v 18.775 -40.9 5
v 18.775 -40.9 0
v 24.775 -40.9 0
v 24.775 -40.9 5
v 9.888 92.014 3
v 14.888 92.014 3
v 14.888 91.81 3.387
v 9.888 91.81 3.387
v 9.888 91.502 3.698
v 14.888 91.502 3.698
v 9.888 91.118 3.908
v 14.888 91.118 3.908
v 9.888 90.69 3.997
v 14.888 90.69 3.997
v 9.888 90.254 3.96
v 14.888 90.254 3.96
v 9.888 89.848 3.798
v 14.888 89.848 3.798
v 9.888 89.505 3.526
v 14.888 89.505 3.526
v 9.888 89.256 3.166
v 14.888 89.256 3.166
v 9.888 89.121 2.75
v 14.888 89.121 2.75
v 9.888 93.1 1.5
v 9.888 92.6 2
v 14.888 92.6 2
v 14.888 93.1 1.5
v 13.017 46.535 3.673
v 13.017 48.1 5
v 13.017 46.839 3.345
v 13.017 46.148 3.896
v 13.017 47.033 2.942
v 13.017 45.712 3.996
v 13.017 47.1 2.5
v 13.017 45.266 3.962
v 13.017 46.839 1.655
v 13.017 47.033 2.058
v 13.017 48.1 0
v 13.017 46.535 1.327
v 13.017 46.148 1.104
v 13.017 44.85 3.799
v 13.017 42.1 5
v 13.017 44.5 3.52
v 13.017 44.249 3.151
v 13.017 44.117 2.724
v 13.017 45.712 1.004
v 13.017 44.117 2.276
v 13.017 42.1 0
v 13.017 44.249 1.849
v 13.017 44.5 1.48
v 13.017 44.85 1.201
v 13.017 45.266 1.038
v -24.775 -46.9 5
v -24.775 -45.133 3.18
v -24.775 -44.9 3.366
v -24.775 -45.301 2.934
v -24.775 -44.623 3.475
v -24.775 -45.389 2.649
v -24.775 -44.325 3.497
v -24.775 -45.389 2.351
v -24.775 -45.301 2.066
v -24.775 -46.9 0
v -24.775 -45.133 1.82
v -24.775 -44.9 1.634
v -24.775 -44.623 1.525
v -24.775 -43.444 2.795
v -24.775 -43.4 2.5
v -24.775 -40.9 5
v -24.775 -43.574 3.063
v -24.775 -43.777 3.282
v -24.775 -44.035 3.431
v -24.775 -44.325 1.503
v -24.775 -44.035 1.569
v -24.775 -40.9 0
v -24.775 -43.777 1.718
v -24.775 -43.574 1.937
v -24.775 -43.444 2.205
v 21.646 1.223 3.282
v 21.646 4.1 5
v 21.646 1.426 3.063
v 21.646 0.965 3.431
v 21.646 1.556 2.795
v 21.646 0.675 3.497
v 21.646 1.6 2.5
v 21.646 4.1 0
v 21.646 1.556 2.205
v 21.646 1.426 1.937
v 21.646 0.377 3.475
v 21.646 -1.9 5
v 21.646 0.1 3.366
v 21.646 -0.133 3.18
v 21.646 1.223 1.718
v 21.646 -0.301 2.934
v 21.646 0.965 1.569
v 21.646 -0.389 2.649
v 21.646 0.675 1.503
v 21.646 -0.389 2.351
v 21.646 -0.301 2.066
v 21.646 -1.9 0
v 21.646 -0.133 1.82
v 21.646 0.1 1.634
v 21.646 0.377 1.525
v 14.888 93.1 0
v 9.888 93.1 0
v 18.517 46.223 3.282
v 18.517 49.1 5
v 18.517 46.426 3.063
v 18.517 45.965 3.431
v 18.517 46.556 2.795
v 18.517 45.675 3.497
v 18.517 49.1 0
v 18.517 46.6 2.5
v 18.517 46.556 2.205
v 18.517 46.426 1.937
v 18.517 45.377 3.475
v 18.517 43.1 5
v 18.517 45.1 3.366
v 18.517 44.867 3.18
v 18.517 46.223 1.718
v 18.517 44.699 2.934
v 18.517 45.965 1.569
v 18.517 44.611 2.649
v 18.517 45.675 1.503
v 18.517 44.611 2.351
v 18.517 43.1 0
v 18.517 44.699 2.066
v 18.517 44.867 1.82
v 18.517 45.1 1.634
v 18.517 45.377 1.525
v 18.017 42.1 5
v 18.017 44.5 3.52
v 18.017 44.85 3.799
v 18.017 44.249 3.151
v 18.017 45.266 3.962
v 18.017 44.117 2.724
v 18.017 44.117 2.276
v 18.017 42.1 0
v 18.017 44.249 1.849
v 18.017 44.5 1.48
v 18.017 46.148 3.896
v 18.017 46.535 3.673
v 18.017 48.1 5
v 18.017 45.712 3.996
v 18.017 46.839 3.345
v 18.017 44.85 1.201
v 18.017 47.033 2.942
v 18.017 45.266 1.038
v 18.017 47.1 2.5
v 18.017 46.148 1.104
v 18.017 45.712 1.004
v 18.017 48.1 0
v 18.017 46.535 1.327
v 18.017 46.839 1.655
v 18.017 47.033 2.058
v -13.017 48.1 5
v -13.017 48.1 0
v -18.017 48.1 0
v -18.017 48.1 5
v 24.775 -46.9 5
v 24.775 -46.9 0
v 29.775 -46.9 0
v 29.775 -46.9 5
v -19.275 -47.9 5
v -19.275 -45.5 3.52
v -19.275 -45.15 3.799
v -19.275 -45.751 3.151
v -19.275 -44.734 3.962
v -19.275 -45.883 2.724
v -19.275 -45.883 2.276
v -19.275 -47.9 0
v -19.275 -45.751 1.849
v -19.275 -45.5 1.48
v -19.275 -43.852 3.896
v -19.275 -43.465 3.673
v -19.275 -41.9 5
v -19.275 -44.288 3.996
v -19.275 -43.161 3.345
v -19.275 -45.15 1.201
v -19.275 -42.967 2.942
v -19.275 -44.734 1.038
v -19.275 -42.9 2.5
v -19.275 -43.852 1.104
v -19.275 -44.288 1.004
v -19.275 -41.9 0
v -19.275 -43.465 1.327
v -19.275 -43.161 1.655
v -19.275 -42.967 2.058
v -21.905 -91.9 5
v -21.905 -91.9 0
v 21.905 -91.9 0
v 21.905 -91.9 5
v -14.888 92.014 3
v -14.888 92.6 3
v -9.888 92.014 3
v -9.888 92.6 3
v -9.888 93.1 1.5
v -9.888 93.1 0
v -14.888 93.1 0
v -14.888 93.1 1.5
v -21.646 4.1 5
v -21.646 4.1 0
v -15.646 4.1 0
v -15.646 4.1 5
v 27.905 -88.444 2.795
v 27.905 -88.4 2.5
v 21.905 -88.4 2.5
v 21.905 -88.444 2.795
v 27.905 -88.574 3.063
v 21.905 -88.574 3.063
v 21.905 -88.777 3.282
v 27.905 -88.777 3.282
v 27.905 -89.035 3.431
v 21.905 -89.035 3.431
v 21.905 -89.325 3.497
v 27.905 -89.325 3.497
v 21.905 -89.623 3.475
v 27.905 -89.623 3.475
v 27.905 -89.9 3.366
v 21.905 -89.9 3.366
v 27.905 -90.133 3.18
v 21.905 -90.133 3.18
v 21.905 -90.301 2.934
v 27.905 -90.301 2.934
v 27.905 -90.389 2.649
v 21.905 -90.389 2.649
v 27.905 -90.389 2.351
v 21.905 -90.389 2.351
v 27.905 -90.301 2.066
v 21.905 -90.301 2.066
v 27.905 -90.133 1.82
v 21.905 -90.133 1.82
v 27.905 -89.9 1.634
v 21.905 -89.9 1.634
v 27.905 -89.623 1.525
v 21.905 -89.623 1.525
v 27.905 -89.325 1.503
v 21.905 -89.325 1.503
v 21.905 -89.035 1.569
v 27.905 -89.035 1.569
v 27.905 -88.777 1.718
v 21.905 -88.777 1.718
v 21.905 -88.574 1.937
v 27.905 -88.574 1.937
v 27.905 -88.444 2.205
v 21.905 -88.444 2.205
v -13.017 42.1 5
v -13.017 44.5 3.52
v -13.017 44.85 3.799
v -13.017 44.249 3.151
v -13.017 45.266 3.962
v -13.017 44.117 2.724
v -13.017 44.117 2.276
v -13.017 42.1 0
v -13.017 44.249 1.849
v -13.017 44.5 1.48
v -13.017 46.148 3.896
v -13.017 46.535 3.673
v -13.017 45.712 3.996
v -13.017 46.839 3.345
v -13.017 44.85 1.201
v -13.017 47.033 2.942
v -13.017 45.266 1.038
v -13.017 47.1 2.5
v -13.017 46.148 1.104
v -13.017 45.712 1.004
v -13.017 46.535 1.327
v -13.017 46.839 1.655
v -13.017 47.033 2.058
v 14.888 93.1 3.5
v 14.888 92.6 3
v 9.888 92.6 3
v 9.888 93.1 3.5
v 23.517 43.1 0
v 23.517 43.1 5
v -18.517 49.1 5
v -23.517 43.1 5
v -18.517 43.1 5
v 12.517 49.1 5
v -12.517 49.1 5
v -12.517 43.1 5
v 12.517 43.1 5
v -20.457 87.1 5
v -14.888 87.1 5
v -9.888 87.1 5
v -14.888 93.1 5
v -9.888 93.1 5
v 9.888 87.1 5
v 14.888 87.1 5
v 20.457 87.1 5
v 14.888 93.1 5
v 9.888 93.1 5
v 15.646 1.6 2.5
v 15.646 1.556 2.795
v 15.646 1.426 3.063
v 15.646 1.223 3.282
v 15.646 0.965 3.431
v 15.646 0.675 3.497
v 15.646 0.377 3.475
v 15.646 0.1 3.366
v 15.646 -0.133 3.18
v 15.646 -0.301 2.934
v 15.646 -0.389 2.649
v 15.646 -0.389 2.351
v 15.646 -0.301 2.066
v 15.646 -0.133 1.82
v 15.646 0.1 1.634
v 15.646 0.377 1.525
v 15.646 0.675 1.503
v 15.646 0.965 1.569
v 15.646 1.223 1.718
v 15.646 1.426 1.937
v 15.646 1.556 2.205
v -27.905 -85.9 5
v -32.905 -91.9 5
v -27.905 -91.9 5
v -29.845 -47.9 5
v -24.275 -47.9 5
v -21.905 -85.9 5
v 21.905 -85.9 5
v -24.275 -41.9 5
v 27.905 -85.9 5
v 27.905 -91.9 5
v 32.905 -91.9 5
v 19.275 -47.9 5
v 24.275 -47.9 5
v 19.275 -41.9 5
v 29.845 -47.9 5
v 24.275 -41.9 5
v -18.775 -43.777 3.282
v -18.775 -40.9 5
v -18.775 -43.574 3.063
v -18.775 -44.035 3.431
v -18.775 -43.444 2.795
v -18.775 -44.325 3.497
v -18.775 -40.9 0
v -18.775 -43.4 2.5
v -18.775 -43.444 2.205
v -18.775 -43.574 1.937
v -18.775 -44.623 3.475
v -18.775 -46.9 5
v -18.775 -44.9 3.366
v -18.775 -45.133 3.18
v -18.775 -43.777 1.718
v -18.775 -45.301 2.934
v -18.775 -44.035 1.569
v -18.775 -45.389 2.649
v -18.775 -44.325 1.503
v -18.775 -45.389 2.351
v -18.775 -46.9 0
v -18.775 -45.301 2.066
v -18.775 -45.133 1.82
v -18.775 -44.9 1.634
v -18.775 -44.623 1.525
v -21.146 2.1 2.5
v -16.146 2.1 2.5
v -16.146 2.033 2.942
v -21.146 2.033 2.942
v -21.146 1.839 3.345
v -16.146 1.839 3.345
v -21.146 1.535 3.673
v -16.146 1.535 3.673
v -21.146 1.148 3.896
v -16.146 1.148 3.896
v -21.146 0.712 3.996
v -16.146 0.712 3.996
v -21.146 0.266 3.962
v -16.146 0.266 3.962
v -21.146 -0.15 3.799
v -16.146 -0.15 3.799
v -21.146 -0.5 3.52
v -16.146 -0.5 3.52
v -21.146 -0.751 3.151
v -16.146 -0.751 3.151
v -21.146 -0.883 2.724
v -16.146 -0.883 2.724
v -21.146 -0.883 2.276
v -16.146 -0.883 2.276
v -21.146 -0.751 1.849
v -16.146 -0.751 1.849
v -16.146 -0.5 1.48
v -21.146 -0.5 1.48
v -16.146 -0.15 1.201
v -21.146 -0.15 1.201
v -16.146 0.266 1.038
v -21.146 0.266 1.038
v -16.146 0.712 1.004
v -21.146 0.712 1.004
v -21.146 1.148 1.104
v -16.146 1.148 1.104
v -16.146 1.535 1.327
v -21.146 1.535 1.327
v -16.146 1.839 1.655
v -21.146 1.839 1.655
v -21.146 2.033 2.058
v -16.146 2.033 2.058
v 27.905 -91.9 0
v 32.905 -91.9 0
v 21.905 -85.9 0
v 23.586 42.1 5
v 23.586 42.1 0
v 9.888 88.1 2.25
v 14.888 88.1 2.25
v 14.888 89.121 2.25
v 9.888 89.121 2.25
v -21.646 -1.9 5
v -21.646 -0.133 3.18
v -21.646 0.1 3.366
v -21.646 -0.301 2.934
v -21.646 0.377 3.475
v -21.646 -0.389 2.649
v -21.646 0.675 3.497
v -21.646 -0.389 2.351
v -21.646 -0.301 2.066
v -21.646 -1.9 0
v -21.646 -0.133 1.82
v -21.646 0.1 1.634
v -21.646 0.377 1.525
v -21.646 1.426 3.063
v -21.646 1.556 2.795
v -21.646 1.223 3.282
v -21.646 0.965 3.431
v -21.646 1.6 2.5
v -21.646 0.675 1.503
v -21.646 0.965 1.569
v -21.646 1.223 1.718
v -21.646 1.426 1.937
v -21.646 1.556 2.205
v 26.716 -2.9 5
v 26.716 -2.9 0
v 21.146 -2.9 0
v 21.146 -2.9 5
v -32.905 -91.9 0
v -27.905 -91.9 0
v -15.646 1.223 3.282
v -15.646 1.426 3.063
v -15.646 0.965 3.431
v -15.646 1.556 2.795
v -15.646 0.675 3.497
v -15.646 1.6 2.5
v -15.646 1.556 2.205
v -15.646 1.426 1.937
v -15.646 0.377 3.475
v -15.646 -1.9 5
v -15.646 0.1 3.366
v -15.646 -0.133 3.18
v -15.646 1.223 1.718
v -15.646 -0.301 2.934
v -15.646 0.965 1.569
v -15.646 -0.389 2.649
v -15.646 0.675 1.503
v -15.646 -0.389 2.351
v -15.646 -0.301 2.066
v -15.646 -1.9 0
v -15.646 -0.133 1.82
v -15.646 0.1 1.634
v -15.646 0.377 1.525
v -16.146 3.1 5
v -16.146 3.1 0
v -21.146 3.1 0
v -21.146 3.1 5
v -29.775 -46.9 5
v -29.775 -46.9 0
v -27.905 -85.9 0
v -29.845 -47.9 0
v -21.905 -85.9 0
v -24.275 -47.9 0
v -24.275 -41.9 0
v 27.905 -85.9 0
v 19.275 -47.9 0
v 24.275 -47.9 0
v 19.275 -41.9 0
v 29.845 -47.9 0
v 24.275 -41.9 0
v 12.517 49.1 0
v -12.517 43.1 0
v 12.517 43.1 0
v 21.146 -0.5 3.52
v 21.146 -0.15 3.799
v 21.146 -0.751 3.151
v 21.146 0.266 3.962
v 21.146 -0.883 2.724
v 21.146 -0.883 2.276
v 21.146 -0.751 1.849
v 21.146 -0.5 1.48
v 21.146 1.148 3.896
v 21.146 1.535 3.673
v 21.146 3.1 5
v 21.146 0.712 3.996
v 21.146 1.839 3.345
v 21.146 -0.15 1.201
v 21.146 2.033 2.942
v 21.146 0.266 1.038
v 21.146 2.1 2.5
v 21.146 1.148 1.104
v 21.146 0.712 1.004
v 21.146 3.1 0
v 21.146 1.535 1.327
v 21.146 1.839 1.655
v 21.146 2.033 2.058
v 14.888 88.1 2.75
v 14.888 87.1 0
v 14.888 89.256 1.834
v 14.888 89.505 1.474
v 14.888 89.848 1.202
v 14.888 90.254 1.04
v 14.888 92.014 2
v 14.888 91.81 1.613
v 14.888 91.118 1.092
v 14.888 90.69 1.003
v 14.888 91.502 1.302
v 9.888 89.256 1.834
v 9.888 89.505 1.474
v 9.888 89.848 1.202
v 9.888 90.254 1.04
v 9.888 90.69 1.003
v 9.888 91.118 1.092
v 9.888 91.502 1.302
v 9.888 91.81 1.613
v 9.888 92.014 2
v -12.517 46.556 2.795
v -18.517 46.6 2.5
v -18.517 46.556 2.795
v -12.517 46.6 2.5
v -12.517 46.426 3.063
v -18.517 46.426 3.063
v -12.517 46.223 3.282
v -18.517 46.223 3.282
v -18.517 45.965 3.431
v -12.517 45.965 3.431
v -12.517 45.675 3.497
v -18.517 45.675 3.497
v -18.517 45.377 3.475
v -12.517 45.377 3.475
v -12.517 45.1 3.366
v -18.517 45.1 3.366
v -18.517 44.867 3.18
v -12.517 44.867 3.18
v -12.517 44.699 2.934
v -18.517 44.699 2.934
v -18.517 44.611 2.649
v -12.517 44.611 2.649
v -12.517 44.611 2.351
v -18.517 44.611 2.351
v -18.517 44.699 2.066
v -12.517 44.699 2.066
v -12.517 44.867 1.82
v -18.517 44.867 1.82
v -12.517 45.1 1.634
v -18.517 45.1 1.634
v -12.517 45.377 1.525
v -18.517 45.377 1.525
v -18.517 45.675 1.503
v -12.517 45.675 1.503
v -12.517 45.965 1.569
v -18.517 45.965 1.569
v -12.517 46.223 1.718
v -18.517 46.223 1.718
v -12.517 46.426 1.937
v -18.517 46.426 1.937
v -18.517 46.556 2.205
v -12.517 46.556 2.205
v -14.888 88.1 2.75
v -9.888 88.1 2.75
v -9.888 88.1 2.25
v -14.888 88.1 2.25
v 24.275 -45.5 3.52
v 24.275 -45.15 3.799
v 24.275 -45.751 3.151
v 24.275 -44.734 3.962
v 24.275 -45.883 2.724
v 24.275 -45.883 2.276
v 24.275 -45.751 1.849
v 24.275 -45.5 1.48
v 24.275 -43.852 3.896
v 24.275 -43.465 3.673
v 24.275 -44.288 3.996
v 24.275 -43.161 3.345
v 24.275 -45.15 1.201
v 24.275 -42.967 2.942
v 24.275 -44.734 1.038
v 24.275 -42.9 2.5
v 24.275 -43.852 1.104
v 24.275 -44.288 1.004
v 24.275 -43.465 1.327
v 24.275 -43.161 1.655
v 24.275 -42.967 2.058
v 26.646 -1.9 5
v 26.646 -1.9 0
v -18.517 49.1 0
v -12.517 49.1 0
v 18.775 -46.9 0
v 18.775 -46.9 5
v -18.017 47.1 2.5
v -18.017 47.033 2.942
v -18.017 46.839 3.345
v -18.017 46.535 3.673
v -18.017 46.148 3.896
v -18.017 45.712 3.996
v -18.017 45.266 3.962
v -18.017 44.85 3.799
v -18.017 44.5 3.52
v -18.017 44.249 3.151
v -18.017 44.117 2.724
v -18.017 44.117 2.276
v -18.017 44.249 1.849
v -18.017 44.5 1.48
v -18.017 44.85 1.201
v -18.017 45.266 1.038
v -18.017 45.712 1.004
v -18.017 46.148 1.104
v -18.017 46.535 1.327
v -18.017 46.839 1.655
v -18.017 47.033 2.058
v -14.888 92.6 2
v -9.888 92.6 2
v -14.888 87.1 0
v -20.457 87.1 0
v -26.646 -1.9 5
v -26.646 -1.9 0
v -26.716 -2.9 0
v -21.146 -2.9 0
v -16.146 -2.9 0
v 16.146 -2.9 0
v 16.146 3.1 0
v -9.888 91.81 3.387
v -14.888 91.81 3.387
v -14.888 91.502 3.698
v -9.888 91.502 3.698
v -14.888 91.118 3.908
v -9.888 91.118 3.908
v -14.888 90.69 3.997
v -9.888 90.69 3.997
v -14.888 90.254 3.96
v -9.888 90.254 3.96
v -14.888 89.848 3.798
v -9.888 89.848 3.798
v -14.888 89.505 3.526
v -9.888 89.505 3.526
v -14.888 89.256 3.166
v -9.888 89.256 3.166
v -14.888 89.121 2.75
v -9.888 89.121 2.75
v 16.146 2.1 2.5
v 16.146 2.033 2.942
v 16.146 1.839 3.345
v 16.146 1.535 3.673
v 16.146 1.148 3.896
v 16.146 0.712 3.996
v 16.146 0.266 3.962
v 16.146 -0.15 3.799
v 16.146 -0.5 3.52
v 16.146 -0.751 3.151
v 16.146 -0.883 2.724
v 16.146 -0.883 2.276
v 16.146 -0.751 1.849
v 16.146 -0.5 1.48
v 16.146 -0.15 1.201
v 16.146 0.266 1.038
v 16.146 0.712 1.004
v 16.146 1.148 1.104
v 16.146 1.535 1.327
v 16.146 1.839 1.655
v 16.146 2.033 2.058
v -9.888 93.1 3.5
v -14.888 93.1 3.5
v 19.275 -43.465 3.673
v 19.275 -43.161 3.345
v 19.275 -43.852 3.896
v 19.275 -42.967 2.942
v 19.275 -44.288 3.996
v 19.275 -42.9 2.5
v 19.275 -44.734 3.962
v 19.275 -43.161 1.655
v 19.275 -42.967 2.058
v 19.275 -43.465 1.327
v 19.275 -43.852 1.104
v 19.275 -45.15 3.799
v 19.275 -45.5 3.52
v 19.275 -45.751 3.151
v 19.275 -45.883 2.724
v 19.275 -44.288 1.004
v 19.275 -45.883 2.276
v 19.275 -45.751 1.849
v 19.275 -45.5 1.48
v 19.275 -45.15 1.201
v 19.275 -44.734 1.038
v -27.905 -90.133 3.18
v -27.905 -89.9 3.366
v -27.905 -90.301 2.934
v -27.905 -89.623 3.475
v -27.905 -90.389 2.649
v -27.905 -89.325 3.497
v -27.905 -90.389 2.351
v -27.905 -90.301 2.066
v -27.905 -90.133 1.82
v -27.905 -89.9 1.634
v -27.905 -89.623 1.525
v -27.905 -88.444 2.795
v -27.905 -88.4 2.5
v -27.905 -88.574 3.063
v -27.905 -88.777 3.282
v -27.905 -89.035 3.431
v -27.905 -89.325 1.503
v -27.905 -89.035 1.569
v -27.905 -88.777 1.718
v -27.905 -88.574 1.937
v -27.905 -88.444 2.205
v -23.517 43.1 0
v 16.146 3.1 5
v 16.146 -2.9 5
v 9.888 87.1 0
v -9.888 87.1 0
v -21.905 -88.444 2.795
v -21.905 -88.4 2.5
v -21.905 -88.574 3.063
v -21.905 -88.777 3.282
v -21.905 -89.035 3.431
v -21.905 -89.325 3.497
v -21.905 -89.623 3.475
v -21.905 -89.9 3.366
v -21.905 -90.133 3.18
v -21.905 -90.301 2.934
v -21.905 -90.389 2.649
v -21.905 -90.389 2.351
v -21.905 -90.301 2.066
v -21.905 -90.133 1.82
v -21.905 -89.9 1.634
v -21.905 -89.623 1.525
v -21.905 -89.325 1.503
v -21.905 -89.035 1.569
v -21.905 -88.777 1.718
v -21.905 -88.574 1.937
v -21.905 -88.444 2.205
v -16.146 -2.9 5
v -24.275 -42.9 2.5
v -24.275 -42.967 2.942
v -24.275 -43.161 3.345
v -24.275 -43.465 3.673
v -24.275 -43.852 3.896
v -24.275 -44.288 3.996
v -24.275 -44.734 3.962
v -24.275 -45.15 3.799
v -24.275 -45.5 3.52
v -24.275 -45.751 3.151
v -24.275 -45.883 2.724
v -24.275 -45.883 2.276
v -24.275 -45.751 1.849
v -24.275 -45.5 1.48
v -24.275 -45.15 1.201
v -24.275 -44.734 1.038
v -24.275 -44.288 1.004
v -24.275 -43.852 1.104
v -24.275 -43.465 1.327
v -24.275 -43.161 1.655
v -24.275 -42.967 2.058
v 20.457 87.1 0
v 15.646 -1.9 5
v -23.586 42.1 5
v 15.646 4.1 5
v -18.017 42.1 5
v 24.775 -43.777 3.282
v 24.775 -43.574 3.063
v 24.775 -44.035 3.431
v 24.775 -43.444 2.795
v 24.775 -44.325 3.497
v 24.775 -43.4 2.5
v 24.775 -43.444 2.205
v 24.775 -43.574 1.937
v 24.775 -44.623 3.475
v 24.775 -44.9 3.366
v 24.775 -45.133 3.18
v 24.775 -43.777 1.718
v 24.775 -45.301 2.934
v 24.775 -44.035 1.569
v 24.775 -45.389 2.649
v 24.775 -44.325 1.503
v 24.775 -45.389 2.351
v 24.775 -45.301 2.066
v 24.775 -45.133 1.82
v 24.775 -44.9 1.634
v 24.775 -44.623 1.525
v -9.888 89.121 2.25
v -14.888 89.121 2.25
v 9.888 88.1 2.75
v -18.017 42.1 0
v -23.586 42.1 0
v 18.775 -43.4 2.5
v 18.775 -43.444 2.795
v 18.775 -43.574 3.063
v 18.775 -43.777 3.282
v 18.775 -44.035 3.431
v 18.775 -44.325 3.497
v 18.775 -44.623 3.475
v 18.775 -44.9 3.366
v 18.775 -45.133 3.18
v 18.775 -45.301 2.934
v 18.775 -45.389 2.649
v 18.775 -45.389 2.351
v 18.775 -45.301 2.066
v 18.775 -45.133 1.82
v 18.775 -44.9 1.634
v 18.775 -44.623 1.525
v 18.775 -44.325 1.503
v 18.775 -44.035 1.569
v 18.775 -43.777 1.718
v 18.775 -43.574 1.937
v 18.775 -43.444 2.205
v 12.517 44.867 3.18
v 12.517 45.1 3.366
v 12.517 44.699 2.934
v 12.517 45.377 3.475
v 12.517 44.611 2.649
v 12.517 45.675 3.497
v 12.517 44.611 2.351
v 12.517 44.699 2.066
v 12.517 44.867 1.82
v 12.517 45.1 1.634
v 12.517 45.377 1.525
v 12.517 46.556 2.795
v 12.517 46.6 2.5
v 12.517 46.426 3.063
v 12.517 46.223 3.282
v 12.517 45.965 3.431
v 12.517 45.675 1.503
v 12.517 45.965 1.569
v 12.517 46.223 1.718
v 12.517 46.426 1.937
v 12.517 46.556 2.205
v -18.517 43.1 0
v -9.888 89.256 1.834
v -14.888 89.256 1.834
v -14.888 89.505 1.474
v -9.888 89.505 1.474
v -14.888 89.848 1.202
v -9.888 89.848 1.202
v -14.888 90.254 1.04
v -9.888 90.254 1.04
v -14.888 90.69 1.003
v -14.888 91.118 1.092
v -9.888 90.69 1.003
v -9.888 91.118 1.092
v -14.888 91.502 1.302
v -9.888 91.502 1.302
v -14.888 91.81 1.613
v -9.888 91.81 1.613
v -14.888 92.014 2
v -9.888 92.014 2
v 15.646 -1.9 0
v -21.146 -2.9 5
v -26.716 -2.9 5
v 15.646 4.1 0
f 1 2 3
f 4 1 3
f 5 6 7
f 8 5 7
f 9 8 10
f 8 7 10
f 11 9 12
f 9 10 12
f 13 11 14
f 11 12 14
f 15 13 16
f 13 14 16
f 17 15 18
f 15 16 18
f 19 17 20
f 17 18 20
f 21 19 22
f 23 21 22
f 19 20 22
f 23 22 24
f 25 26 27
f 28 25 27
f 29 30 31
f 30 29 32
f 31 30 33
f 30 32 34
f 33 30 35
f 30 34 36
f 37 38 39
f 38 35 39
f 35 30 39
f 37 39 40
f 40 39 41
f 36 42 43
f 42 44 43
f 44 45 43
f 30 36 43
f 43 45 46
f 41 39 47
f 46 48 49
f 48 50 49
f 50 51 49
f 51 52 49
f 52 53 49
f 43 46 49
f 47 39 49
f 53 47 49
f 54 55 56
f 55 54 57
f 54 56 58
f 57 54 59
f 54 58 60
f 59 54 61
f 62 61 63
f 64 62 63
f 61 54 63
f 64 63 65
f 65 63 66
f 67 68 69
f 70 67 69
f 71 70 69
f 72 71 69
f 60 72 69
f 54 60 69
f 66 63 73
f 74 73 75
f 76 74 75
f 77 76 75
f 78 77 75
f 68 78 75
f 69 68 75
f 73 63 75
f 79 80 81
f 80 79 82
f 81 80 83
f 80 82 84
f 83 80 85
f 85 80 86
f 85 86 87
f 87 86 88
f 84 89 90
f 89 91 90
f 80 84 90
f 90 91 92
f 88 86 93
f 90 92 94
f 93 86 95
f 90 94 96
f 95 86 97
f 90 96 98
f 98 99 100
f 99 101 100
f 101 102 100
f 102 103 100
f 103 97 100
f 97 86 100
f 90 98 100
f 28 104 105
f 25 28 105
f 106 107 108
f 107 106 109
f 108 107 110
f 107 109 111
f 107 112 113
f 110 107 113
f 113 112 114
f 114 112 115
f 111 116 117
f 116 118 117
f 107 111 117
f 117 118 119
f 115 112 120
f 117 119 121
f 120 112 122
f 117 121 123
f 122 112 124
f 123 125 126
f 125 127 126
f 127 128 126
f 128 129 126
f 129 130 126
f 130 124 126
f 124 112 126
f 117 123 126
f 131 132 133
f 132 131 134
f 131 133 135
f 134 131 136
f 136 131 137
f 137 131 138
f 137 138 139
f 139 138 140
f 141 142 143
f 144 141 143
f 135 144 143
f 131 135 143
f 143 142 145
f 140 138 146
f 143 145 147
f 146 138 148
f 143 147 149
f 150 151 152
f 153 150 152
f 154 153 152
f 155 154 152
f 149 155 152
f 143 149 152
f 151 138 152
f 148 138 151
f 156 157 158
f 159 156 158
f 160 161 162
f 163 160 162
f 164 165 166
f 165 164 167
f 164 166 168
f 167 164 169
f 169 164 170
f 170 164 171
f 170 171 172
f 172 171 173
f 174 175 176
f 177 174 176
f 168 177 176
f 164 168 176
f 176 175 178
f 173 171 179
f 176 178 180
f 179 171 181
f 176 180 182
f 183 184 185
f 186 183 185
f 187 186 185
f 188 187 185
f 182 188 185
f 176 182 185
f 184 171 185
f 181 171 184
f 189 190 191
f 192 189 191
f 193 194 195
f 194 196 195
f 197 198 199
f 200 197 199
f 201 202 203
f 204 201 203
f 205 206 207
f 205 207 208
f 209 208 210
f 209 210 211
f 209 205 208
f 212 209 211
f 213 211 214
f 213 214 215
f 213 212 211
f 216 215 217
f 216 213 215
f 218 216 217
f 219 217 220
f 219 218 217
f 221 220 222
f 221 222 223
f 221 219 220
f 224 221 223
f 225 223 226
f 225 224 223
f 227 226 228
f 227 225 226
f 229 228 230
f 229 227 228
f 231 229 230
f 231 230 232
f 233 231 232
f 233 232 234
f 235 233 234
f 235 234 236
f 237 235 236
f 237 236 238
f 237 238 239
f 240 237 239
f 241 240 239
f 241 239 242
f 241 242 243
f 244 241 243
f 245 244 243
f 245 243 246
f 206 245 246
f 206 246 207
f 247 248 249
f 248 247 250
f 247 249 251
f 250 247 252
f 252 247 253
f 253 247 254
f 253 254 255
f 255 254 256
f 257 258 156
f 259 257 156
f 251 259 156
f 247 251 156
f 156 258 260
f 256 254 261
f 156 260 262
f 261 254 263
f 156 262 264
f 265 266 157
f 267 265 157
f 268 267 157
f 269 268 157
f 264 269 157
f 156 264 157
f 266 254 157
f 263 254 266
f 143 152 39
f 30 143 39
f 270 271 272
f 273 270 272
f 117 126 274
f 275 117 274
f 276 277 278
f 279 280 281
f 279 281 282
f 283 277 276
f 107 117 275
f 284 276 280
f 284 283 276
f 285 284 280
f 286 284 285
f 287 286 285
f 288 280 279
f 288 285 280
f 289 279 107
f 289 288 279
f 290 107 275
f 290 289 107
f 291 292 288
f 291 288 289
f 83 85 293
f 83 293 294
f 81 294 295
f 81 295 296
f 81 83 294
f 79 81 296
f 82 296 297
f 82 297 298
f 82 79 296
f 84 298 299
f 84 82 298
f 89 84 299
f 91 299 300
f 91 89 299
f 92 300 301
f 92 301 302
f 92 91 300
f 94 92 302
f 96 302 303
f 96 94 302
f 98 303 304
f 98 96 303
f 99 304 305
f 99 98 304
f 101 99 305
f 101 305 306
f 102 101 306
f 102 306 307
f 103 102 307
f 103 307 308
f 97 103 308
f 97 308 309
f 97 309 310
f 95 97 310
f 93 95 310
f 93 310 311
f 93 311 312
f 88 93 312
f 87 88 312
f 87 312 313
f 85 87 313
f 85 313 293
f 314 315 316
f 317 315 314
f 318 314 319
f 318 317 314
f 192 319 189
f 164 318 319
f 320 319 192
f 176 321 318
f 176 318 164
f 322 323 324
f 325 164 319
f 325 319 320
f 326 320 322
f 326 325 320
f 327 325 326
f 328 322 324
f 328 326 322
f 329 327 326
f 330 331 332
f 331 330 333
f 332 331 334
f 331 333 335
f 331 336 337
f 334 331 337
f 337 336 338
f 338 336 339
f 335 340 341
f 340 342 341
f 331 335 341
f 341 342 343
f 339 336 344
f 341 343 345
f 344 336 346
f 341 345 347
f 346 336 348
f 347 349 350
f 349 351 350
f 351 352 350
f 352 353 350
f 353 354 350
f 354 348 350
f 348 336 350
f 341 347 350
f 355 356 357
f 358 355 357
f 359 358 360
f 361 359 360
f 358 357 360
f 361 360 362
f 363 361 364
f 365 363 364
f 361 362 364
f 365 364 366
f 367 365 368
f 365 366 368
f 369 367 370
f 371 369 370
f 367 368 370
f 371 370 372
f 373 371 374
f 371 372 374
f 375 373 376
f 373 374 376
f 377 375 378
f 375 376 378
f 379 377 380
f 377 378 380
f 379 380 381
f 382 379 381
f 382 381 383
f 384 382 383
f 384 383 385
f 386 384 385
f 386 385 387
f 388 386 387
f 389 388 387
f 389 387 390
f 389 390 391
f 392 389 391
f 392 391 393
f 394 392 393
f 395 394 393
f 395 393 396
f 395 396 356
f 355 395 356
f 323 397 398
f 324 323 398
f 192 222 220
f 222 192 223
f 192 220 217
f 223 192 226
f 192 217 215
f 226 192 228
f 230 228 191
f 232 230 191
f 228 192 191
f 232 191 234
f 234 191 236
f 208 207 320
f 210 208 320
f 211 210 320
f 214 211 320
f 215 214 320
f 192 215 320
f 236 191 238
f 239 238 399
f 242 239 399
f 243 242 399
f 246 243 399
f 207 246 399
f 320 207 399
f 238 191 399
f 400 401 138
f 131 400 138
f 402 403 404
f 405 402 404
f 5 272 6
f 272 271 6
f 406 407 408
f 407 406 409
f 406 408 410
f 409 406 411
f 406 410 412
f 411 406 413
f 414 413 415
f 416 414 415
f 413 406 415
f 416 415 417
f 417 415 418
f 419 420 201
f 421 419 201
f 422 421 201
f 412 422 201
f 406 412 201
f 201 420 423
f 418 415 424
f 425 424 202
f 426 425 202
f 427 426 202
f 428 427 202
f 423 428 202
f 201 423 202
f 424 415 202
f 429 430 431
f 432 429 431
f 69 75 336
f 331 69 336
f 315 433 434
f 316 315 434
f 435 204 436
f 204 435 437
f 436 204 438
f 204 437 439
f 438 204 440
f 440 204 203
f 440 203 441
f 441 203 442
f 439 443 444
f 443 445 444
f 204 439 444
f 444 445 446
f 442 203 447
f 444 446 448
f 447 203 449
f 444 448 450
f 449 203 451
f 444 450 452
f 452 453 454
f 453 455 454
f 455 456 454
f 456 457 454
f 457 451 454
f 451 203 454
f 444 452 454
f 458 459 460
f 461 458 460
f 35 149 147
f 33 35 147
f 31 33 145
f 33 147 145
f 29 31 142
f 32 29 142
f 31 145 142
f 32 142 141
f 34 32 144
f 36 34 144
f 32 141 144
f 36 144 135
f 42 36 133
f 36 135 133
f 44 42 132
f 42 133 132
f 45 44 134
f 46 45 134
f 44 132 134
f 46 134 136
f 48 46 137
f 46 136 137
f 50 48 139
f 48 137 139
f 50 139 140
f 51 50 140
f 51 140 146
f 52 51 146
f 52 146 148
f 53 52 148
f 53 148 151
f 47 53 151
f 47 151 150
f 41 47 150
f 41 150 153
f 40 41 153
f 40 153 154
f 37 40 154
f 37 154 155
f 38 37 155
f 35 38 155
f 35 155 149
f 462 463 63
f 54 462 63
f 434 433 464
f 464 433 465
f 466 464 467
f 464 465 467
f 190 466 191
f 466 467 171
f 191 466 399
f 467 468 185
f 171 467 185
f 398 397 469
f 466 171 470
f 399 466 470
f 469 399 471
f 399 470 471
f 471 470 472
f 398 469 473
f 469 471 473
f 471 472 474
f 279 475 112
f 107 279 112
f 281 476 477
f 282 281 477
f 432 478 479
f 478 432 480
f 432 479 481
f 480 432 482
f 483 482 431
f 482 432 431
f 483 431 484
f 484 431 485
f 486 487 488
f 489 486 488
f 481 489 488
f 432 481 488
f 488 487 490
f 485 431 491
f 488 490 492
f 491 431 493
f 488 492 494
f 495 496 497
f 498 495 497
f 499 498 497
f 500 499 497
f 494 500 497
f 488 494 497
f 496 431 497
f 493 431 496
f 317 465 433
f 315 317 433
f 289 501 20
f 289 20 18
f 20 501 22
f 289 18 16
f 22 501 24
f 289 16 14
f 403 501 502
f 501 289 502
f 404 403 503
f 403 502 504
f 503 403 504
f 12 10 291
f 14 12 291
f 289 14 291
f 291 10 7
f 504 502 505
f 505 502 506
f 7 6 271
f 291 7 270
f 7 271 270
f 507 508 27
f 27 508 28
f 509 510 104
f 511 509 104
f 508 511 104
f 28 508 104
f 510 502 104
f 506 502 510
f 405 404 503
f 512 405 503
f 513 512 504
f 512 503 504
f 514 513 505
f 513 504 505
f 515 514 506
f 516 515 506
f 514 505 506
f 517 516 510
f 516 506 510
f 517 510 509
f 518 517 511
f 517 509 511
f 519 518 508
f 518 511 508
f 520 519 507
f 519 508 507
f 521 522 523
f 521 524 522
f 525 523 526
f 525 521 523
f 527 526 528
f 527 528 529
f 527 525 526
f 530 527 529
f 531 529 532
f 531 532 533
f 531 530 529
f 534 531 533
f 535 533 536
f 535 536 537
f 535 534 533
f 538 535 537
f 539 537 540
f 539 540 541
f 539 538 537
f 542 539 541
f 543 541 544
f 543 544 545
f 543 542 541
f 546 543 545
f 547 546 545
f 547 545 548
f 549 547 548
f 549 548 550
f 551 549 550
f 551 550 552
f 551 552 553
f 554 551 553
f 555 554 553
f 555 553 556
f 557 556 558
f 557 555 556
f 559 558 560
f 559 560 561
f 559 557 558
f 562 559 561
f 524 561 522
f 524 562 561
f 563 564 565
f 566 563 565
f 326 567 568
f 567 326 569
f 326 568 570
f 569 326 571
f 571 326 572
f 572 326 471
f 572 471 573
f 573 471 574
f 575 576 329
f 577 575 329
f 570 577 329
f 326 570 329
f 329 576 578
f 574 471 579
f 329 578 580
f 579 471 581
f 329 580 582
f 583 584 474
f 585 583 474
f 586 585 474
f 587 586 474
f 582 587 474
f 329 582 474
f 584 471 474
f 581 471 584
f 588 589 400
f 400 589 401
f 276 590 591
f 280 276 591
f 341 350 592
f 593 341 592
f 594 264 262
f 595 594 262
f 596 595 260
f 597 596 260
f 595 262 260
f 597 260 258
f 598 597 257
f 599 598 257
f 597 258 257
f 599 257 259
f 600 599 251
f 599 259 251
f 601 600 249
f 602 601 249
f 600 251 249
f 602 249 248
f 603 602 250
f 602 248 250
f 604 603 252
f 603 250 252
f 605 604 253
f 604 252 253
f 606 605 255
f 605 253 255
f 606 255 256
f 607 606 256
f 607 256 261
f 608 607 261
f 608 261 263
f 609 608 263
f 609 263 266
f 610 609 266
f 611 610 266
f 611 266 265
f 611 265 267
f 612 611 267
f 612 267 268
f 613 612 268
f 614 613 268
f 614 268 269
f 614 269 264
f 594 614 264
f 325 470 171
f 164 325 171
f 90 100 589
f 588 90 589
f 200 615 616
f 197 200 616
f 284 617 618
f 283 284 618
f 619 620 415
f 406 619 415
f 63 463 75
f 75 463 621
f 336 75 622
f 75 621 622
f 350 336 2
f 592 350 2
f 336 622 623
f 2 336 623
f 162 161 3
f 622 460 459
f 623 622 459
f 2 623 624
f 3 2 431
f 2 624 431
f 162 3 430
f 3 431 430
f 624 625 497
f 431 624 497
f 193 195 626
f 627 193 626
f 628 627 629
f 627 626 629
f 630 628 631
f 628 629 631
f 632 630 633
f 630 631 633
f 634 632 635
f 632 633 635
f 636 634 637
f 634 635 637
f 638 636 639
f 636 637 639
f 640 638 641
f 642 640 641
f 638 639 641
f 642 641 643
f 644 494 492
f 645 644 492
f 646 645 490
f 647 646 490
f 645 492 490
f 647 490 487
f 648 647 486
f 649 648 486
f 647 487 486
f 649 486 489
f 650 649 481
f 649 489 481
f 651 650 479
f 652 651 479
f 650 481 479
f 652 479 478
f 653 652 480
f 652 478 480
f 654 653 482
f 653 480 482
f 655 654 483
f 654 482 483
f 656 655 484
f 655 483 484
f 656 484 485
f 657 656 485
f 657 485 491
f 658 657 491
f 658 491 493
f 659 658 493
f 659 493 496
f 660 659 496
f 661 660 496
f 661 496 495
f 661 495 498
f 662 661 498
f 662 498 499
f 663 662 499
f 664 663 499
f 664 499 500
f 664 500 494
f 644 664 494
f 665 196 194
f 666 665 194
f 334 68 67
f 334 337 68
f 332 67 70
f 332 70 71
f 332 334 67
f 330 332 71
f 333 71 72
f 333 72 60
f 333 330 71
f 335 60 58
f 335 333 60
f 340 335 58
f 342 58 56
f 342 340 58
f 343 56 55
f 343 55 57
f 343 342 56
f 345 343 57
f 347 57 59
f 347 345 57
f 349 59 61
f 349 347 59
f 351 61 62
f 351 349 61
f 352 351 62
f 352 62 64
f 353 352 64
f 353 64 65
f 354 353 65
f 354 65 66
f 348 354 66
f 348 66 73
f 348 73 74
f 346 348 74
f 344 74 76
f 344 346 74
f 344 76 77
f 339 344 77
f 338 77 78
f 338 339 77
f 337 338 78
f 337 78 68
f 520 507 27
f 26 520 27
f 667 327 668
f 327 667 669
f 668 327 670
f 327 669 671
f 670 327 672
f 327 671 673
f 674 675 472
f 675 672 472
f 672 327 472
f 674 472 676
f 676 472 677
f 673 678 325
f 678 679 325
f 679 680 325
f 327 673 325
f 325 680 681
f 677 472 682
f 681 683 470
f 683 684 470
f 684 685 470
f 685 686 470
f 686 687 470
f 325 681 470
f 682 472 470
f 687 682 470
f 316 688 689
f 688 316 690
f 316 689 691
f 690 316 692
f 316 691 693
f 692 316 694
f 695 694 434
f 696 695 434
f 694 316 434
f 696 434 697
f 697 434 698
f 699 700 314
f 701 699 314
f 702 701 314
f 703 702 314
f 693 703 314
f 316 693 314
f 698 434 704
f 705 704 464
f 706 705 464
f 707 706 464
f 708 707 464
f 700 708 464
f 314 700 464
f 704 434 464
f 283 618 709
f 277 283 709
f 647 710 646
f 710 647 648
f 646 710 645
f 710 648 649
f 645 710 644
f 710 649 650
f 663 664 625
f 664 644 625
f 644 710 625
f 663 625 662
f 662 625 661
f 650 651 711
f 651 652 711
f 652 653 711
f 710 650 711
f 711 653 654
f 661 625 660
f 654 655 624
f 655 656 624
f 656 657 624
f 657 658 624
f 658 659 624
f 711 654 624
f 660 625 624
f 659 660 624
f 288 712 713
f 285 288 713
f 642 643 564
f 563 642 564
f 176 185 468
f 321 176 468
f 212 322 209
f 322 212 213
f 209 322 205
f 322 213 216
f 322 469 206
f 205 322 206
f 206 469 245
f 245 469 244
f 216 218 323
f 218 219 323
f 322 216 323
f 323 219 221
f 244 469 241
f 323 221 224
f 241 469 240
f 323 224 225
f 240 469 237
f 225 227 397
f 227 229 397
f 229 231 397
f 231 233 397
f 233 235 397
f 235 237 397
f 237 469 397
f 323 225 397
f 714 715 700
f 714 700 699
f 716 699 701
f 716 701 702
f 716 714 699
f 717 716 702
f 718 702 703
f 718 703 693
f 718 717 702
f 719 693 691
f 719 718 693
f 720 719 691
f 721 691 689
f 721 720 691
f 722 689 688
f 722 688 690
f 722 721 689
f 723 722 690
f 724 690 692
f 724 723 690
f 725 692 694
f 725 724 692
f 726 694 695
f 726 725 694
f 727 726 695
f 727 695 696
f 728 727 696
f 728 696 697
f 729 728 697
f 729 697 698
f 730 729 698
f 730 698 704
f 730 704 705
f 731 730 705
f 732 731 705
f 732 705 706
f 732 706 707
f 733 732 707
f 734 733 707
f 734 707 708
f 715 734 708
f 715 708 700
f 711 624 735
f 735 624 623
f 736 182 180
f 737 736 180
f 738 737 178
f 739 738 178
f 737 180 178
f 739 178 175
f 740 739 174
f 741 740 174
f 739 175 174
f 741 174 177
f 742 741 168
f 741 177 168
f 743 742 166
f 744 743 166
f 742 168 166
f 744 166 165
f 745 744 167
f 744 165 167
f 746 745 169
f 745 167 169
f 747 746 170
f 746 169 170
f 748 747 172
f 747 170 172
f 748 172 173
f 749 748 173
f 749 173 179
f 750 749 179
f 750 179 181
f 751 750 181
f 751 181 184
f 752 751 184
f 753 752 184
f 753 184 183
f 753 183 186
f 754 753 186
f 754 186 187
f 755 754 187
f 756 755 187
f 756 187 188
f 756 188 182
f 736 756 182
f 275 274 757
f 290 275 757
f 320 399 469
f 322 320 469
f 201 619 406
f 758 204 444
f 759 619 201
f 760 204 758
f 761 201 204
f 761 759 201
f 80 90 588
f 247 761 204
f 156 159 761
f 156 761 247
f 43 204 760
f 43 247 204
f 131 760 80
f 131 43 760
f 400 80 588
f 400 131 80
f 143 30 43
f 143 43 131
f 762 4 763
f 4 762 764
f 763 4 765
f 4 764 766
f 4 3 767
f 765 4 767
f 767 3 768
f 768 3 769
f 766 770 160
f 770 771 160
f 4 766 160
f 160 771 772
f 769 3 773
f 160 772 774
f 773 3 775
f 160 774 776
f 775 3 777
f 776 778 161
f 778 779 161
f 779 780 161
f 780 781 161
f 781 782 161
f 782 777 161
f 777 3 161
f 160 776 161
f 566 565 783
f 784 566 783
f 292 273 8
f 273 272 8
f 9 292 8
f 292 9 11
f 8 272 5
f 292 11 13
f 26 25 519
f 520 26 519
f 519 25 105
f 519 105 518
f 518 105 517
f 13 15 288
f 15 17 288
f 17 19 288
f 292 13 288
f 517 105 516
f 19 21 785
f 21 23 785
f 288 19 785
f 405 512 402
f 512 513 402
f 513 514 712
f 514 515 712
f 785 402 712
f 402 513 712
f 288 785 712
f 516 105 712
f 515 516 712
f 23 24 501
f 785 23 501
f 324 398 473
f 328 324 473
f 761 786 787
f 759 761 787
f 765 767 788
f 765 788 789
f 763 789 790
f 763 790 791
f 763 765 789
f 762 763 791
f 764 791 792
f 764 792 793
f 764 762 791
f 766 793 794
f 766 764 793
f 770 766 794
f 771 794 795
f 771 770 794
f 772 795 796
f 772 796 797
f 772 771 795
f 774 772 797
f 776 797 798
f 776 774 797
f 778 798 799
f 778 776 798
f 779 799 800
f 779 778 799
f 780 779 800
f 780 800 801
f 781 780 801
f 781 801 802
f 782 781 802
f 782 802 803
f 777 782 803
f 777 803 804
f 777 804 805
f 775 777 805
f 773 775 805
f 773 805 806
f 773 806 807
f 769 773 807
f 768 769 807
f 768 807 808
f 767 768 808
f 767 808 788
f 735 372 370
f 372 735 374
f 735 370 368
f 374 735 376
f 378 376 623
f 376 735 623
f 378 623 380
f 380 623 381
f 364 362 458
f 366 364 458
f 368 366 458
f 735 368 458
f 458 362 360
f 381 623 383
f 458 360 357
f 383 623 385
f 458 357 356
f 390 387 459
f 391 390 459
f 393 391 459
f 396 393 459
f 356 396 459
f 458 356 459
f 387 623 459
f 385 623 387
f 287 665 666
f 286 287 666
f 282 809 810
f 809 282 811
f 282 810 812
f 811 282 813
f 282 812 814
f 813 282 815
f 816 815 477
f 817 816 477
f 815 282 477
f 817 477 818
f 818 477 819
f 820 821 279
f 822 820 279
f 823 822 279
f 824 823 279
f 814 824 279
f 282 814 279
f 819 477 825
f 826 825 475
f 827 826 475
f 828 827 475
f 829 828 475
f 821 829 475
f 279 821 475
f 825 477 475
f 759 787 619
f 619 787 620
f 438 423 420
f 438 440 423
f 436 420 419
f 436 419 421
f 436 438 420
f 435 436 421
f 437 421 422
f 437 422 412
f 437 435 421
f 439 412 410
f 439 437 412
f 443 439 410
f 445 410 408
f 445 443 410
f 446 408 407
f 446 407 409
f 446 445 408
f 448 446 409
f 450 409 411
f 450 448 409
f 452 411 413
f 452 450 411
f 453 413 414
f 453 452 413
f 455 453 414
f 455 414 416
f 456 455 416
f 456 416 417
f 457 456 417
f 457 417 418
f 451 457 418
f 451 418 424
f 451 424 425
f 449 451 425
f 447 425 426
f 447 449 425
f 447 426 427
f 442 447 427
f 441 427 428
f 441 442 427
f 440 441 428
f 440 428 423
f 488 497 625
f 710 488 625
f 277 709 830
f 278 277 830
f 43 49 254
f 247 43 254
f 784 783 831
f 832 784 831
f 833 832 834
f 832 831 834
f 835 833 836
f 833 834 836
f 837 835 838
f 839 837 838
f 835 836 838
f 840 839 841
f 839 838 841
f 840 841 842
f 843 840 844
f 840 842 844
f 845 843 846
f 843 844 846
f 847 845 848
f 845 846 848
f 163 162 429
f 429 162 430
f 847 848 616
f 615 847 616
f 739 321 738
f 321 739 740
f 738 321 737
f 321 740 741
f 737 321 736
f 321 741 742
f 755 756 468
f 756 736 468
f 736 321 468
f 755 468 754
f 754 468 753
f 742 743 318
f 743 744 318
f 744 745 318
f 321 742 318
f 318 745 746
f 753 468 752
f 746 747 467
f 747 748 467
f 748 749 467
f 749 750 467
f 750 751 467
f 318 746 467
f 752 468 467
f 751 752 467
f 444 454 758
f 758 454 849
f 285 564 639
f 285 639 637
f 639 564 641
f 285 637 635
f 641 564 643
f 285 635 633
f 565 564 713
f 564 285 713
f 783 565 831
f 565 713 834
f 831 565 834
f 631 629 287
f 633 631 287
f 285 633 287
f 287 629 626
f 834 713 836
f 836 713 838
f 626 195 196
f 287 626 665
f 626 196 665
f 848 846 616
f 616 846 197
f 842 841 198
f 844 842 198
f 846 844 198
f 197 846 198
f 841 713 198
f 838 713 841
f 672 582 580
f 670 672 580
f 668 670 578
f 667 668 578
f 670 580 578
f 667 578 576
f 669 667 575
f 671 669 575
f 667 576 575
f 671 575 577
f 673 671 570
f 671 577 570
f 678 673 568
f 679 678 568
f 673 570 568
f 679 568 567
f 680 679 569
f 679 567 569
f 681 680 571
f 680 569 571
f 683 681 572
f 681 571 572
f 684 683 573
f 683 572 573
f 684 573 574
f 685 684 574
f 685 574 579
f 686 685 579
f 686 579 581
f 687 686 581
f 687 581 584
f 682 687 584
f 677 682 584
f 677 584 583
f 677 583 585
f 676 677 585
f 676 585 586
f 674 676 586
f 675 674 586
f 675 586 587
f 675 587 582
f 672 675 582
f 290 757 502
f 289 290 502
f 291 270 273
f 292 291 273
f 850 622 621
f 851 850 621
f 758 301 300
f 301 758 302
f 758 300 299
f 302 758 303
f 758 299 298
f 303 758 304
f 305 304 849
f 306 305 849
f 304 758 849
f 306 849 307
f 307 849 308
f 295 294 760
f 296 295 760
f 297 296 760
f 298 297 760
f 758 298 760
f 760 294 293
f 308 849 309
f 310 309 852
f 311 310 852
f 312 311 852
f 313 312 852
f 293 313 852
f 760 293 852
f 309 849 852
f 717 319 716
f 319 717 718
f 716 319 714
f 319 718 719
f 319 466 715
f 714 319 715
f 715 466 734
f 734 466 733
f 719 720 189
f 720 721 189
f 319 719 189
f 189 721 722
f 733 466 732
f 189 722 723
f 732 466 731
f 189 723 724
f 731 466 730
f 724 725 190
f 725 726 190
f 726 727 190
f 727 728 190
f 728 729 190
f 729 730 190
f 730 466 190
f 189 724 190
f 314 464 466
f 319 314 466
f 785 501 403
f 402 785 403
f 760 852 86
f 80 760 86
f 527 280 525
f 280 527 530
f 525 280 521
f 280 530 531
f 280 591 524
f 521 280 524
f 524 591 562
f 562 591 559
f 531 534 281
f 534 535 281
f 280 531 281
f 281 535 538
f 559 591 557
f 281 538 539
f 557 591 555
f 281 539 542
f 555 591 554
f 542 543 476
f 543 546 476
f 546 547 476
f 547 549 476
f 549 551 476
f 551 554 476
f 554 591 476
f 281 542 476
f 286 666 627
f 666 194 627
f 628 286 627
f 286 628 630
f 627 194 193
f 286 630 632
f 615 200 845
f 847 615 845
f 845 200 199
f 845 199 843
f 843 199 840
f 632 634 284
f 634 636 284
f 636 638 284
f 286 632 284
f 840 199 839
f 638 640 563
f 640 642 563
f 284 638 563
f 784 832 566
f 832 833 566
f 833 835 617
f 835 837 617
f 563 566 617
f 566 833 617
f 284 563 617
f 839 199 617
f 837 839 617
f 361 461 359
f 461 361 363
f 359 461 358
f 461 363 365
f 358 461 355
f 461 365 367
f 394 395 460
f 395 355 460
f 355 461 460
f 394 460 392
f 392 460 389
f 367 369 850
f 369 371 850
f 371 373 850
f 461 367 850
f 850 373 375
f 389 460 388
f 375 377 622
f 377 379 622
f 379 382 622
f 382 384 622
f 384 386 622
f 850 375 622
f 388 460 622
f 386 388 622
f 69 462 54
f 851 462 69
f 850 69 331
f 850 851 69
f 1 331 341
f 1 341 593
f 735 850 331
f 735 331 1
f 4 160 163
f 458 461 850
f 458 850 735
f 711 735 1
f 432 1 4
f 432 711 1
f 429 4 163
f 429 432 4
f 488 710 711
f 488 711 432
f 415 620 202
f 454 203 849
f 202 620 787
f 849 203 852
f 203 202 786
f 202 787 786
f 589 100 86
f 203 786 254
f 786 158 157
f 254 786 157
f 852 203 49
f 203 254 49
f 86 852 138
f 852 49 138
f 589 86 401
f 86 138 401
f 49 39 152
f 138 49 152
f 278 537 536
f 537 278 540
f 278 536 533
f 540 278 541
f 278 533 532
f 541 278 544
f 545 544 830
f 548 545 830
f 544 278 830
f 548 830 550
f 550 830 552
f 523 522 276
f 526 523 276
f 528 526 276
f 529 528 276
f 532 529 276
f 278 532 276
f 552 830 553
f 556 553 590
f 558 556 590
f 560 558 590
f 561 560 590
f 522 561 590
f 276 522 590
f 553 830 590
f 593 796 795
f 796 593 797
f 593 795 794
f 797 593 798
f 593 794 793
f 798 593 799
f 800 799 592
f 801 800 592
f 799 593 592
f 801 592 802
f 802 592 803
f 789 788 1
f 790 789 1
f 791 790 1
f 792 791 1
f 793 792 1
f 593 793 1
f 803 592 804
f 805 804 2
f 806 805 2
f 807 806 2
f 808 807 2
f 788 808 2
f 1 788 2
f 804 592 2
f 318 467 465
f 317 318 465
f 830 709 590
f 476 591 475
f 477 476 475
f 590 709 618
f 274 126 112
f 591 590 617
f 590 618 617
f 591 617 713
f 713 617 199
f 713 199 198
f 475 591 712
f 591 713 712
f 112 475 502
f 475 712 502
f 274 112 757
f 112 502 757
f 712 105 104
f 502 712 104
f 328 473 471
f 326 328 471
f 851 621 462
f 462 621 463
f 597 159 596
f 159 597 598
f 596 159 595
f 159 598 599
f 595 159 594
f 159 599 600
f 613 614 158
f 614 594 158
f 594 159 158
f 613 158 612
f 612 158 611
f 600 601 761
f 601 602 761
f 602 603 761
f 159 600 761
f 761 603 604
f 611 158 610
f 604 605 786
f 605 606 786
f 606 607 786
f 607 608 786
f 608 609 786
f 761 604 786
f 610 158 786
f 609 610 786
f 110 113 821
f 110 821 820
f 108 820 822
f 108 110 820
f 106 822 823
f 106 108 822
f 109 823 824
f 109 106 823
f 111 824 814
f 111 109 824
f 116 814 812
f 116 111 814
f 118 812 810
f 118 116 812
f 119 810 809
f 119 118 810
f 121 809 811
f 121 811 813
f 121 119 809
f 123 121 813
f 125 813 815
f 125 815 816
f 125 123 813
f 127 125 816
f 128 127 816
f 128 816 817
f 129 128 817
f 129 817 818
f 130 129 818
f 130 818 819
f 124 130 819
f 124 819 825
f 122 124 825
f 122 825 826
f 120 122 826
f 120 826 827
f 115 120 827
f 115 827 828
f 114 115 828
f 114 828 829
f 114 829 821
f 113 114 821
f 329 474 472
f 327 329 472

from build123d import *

# Parameters (mm, degrees)
F1_DEPTH  = 5
F12_START = -5.7
F10_R     = 1
F12_DEPTH = 62
F13_START = -5.5
F9_R      = 1.5
F9_R_2    = 1
F13_DEPTH = 55.3
F14_START = -6
F14_DEPTH = 56.6
F15_START = -6.3
F8_R      = 1.5
F8_R_2    = 1
F15_DEPTH = 49.5
F16_START = -5.7
F16_DEPTH = 49
F17_START = -6
F7_R      = 1.5
F7_R_2    = 1
F17_DEPTH = 43.6
F18_START = -5.7
F18_DEPTH = 42.3
F19_DEPTH = 45.5
F20_SIZE  = 0.5


with BuildPart() as f1:
    # F0 (on Top) → F1 (new body)
    with BuildSketch(Plane.XY):
        Polygon((-20.4571957112, 87.1), (-23.5168766766, 43.1), (-18.5168766766, 43.1), (-18.5168766766, 49.1), (-12.5168766766, 49.1), (-12.5168766766, 43.1), (12.5168766766, 43.1), (12.5168766766, 49.1), (18.5168766766, 49.1), (18.5168766766, 43.1), (23.5168766766, 43.1), (20.4571957112, 87.1), (14.8876575074, 87.1), (14.8876575074, 93.1), (9.8876575074, 93.1), (9.8876575074, 87.1), (-9.8876575074, 87.1), (-9.8876575074, 93.1), (-14.8876575074, 93.1), (-14.8876575074, 87.1), align=None)
    extrude(amount=F1_DEPTH)



with BuildPart() as f1b:
    # F0 (on Top) → F1, piece 2 (new body)
    with BuildSketch(Plane.XY):
        Polygon((-23.5864148803, 42.1), (-26.6460958457, -1.9), (-21.6460958457, -1.9), (-21.6460958457, 4.1), (-15.6460958457, 4.1), (-15.6460958457, -1.9), (15.6460958457, -1.9), (15.6460958457, 4.1), (21.6460958457, 4.1), (21.6460958457, -1.9), (26.6460958457, -1.9), (23.5864148803, 42.1), (18.0168766766, 42.1), (18.0168766766, 48.1), (13.0168766766, 48.1), (13.0168766766, 42.1), (-13.0168766766, 42.1), (-13.0168766766, 48.1), (-18.0168766766, 48.1), (-18.0168766766, 42.1), align=None)
    extrude(amount=F1_DEPTH)



with BuildPart() as f1c:
    # F0 (on Top) → F1, piece 3 (new body)
    with BuildSketch(Plane.XY):
        Polygon((-26.7156340495, -2.9), (-29.7753150149, -46.9), (-24.7753150149, -46.9), (-24.7753150149, -40.9), (-18.7753150149, -40.9), (-18.7753150149, -46.9), (18.7753150149, -46.9), (18.7753150149, -40.9), (24.7753150149, -40.9), (24.7753150149, -46.9), (29.7753150149, -46.9), (26.7156340495, -2.9), (21.1460958457, -2.9), (21.1460958457, 3.1), (16.1460958457, 3.1), (16.1460958457, -2.9), (-16.1460958457, -2.9), (-16.1460958457, 3.1), (-21.1460958457, 3.1), (-21.1460958457, -2.9), align=None)
    extrude(amount=F1_DEPTH)



with BuildPart() as f1d:
    # F0 (on Top) → F1, piece 4 (new body)
    with BuildSketch(Plane.XY):
        Polygon((-29.8448532186, -47.9), (-32.904534184, -91.9), (-27.904534184, -91.9), (-27.904534184, -85.9), (-21.904534184, -85.9), (-21.904534184, -91.9), (21.904534184, -91.9), (21.904534184, -85.9), (27.904534184, -85.9), (27.904534184, -91.9), (32.904534184, -91.9), (29.8448532186, -47.9), (24.2753150149, -47.9), (24.2753150149, -41.9), (19.2753150149, -41.9), (19.2753150149, -47.9), (-19.2753150149, -47.9), (-19.2753150149, -41.9), (-24.2753150149, -41.9), (-24.2753150149, -47.9), align=None)
    extrude(amount=F1_DEPTH)

    # F10 (on offset) → F12 (join)
    with BuildSketch(Plane.YZ.offset(36.904534184).offset(F12_START)):
        with Locations((-89.4, 2.5)):
            Circle(F10_R)
    extrude(amount=-F12_DEPTH)

    # F9 (on offset) → F13 (cut)
    with BuildSketch(Plane.YZ.offset(34.2753150149).offset(F13_START)):
        with Locations((-44.4, 2.5)):
            Circle(F9_R)
        with Locations((-44.4, 2.5)):
            Circle(F9_R_2, mode=Mode.SUBTRACT)
    extrude(amount=-F13_DEPTH, mode=Mode.SUBTRACT)


with BuildPart() as f1c_1:
    add(f1c.part)

    add(f1d.part)  # F14 merges F1d
    # F9 (on offset) → F14 (join)
    with BuildSketch(Plane.YZ.offset(34.2753150149).offset(F14_START)):
        with Locations((-44.4, 2.5)):
            Circle(F9_R_2)
    extrude(amount=-F14_DEPTH)

    # F8 (on offset) → F15 (cut)
    with BuildSketch(Plane.YZ.offset(31.1460958457).offset(F15_START)):
        with Locations((0.6, 2.5)):
            Circle(F8_R)
        with Locations((0.6, 2.5)):
            Circle(F8_R_2, mode=Mode.SUBTRACT)
    extrude(amount=-F15_DEPTH, mode=Mode.SUBTRACT)


with BuildPart() as f1b_1:
    add(f1b.part)

    add(f1c_1.part)  # F16 merges F1c
    # F8 (on offset) → F16 (join)
    with BuildSketch(Plane.YZ.offset(31.1460958457).offset(F16_START)):
        with Locations((0.6, 2.5)):
            Circle(F8_R_2)
    extrude(amount=-F16_DEPTH)

    # F7 (on offset) → F17 (cut)
    with BuildSketch(Plane.YZ.offset(28.0168766766).offset(F17_START)):
        with Locations((45.6, 2.5)):
            Circle(F7_R)
        with Locations((45.6, 2.5)):
            Circle(F7_R_2, mode=Mode.SUBTRACT)
    extrude(amount=-F17_DEPTH, mode=Mode.SUBTRACT)


with BuildPart() as f1_1:
    add(f1.part)

    add(f1b_1.part)  # F18 merges F1b
    # F7 (on offset) → F18 (join)
    with BuildSketch(Plane.YZ.offset(28.0168766766).offset(F18_START)):
        with Locations((45.6, 2.5)):
            Circle(F7_R_2)
    extrude(amount=-F18_DEPTH)

    # F11 (on offset) → F19 (cut)
    with BuildSketch(Plane.YZ.offset(24.8876575074)):
        with BuildLine():
            Line((95.6, 3), (92.0142135624, 3))
            ThreePointArc((92.0142135624, 3), (90.4708684127, 3.9944313411), (89.1209800542, 2.75))
            Line((89.1209800542, 2.75), (88.1, 2.75))
            Line((88.1, 2.75), (88.1, 2.25))
            Line((88.1, 2.25), (89.1209800542, 2.25))
            ThreePointArc((89.1209800542, 2.25), (90.4708684127, 1.0055686589), (92.0142135624, 2))
            Line((92.0142135624, 2), (95.6, 2))
            Line((95.6, 2), (95.6, 3))
        make_face()
    extrude(amount=-F19_DEPTH, mode=Mode.SUBTRACT)

    # F20
    f20_edges = [f1_1.edges().sort_by_distance(p)[0] for p in [
        (-12.387658, 93.1, 3),
        (-12.387658, 93.1, 2),
        (12.387658, 93.1, 3),
        (12.387658, 93.1, 2),
    ]]
    chamfer(f20_edges, length=F20_SIZE)


solid = f1_1.part
